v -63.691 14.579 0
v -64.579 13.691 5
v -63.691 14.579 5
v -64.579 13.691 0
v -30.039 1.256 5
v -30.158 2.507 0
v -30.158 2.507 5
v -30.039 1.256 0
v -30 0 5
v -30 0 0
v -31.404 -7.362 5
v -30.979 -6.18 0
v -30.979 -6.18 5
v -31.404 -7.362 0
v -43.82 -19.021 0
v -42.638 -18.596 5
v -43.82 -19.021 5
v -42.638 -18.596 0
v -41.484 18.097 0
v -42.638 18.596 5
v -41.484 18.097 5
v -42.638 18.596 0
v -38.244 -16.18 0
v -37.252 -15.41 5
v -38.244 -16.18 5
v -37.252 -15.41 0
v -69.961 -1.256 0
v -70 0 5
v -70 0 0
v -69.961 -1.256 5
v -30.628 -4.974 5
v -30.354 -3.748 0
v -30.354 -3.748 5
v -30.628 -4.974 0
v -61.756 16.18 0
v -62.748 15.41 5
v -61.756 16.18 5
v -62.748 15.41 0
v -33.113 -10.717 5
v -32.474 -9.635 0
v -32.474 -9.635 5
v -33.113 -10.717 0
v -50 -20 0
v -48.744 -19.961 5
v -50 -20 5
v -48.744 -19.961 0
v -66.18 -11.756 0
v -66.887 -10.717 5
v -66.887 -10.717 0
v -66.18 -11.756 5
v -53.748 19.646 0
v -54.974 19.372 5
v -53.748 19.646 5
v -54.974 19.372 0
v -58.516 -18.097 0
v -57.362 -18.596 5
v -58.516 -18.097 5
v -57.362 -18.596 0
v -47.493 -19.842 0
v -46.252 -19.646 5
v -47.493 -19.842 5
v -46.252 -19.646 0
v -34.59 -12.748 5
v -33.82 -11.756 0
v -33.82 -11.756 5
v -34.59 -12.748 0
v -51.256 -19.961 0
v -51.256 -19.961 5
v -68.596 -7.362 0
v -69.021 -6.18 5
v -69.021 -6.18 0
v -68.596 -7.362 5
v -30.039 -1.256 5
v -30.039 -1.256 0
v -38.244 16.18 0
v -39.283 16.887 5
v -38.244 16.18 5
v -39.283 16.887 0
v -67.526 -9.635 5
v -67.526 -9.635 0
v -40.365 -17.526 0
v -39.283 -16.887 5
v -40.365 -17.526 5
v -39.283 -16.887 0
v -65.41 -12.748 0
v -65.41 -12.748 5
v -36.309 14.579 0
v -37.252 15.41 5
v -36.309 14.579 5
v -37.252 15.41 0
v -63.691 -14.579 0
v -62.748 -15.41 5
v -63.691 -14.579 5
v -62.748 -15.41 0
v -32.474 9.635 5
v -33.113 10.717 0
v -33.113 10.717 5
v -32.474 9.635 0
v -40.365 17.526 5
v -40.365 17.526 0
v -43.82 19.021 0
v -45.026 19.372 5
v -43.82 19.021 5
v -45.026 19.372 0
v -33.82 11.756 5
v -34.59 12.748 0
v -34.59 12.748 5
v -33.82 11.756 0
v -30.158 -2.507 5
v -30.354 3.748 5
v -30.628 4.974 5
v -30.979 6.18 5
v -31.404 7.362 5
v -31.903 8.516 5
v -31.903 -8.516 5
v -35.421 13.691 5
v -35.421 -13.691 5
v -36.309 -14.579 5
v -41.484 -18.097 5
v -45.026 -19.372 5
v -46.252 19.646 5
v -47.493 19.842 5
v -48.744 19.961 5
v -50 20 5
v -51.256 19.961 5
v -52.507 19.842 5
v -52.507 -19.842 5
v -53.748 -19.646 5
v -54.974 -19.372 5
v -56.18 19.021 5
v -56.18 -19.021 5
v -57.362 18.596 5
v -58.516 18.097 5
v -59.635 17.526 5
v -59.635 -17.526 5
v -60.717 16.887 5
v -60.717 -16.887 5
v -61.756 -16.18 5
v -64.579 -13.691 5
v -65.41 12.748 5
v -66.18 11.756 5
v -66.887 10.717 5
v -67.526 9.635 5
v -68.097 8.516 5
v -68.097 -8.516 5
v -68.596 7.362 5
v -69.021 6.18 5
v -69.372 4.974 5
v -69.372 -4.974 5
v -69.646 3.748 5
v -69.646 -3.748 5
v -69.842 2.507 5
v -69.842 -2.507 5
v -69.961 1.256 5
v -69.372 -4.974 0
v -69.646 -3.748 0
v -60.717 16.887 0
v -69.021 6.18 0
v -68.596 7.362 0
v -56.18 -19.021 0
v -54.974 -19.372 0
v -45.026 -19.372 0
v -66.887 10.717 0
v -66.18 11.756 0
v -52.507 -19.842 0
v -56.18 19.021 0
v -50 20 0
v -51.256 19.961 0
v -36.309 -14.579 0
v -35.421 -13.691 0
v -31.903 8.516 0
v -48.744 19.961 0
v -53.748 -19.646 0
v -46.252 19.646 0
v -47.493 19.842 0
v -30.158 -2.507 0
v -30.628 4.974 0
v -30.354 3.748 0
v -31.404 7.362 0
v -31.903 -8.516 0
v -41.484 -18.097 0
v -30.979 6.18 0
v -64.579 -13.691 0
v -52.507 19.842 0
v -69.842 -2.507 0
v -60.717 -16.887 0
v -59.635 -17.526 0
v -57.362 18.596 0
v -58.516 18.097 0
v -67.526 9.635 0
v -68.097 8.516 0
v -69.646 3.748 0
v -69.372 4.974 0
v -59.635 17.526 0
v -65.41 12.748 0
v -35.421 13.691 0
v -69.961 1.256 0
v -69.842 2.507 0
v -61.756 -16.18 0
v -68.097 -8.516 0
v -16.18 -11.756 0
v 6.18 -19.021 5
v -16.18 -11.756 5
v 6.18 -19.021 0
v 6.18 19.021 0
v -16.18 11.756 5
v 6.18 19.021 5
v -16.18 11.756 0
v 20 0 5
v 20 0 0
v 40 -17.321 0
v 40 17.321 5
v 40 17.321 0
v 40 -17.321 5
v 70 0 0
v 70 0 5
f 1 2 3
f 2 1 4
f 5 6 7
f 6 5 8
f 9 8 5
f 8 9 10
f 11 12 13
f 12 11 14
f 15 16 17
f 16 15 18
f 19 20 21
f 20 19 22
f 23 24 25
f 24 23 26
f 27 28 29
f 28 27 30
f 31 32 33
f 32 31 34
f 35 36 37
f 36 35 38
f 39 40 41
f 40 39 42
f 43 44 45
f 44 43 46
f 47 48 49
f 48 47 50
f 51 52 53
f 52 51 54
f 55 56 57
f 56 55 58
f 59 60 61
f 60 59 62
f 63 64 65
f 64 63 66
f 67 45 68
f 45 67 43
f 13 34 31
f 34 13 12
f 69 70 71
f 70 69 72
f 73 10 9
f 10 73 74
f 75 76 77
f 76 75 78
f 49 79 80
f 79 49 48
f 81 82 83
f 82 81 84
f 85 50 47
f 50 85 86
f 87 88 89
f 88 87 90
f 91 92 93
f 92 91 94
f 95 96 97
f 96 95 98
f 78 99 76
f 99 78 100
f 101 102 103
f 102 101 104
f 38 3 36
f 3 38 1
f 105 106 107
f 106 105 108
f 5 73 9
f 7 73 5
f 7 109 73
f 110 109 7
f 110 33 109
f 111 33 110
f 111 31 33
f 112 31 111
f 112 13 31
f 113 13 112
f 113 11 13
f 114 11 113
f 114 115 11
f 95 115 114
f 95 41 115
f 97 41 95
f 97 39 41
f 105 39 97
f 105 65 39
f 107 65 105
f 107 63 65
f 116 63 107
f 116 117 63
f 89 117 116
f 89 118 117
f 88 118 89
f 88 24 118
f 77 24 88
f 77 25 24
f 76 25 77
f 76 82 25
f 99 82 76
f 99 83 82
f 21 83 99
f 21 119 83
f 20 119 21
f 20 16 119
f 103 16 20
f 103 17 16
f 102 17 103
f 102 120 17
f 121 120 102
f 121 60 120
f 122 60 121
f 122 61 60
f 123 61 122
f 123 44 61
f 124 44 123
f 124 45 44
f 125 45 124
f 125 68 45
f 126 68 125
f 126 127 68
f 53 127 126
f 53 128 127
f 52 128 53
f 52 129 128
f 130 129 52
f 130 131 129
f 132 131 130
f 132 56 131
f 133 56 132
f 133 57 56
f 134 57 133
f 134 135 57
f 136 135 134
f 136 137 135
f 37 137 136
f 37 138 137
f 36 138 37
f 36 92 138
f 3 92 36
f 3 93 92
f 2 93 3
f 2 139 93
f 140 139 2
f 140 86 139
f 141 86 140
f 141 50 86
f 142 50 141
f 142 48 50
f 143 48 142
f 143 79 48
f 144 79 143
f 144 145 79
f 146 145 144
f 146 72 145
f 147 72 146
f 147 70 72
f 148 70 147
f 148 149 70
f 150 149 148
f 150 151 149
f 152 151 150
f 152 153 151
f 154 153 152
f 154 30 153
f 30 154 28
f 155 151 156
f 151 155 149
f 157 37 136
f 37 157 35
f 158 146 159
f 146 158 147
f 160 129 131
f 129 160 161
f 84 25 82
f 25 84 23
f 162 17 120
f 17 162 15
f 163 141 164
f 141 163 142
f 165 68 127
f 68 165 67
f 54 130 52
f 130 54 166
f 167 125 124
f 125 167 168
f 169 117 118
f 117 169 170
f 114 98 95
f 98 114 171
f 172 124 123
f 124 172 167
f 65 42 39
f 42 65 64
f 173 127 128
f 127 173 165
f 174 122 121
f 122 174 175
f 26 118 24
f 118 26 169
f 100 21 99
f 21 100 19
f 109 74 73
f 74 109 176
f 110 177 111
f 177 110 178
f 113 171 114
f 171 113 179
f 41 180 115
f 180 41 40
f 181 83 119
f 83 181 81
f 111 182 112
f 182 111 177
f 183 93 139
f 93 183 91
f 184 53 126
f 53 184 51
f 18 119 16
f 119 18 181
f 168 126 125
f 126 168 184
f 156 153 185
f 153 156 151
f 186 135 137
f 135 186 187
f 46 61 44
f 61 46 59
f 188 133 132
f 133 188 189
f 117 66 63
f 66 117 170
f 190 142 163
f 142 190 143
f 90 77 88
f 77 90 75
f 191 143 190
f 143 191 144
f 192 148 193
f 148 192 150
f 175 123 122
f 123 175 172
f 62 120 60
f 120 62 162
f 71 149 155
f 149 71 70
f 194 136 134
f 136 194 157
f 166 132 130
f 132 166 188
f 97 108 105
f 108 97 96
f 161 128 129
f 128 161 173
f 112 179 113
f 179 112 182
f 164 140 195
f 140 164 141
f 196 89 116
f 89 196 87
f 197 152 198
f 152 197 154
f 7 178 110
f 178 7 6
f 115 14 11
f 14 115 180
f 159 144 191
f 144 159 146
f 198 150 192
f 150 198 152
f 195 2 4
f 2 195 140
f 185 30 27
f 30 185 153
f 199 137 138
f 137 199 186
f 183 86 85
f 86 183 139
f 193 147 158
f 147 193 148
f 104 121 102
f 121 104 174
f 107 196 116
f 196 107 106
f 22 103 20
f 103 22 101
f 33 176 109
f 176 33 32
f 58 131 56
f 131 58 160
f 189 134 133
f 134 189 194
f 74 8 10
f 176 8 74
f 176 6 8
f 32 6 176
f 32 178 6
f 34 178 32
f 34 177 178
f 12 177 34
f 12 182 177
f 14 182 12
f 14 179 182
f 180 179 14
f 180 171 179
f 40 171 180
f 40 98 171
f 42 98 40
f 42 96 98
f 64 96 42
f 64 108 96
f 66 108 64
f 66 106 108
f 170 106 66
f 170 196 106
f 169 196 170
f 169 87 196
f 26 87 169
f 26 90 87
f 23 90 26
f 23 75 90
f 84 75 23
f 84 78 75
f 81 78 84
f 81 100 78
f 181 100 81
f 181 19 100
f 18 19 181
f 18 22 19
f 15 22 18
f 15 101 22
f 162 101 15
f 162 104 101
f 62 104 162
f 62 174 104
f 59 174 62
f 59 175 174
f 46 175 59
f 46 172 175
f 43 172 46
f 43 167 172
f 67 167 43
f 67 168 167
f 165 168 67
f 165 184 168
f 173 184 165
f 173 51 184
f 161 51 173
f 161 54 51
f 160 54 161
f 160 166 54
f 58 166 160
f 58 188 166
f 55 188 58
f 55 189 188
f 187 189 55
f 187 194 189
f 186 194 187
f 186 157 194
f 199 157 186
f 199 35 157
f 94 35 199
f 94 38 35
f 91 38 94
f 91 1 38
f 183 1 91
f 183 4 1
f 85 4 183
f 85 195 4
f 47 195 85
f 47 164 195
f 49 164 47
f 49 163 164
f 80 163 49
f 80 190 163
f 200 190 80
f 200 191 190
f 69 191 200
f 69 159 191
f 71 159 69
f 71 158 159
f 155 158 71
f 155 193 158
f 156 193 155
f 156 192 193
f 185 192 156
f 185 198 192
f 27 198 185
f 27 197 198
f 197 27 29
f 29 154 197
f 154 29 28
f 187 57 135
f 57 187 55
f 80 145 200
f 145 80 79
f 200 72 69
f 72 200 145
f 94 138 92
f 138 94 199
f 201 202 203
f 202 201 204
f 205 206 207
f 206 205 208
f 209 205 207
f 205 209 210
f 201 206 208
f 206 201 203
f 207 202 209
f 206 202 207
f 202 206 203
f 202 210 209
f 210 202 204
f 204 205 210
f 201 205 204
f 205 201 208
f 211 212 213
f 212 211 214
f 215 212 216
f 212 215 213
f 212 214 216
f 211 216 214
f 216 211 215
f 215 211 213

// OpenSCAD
// cilindro basico

//moneda
translate([-50,0,0])
 cylinder(r=40/2, h=5,$fn=100);

//hexagono
cylinder(r=40/2,h=5,$fn=5);

//triangulo equilatero
translate([50,0,0])
    cylinder(r=40/2,h=5,$fn=3);
